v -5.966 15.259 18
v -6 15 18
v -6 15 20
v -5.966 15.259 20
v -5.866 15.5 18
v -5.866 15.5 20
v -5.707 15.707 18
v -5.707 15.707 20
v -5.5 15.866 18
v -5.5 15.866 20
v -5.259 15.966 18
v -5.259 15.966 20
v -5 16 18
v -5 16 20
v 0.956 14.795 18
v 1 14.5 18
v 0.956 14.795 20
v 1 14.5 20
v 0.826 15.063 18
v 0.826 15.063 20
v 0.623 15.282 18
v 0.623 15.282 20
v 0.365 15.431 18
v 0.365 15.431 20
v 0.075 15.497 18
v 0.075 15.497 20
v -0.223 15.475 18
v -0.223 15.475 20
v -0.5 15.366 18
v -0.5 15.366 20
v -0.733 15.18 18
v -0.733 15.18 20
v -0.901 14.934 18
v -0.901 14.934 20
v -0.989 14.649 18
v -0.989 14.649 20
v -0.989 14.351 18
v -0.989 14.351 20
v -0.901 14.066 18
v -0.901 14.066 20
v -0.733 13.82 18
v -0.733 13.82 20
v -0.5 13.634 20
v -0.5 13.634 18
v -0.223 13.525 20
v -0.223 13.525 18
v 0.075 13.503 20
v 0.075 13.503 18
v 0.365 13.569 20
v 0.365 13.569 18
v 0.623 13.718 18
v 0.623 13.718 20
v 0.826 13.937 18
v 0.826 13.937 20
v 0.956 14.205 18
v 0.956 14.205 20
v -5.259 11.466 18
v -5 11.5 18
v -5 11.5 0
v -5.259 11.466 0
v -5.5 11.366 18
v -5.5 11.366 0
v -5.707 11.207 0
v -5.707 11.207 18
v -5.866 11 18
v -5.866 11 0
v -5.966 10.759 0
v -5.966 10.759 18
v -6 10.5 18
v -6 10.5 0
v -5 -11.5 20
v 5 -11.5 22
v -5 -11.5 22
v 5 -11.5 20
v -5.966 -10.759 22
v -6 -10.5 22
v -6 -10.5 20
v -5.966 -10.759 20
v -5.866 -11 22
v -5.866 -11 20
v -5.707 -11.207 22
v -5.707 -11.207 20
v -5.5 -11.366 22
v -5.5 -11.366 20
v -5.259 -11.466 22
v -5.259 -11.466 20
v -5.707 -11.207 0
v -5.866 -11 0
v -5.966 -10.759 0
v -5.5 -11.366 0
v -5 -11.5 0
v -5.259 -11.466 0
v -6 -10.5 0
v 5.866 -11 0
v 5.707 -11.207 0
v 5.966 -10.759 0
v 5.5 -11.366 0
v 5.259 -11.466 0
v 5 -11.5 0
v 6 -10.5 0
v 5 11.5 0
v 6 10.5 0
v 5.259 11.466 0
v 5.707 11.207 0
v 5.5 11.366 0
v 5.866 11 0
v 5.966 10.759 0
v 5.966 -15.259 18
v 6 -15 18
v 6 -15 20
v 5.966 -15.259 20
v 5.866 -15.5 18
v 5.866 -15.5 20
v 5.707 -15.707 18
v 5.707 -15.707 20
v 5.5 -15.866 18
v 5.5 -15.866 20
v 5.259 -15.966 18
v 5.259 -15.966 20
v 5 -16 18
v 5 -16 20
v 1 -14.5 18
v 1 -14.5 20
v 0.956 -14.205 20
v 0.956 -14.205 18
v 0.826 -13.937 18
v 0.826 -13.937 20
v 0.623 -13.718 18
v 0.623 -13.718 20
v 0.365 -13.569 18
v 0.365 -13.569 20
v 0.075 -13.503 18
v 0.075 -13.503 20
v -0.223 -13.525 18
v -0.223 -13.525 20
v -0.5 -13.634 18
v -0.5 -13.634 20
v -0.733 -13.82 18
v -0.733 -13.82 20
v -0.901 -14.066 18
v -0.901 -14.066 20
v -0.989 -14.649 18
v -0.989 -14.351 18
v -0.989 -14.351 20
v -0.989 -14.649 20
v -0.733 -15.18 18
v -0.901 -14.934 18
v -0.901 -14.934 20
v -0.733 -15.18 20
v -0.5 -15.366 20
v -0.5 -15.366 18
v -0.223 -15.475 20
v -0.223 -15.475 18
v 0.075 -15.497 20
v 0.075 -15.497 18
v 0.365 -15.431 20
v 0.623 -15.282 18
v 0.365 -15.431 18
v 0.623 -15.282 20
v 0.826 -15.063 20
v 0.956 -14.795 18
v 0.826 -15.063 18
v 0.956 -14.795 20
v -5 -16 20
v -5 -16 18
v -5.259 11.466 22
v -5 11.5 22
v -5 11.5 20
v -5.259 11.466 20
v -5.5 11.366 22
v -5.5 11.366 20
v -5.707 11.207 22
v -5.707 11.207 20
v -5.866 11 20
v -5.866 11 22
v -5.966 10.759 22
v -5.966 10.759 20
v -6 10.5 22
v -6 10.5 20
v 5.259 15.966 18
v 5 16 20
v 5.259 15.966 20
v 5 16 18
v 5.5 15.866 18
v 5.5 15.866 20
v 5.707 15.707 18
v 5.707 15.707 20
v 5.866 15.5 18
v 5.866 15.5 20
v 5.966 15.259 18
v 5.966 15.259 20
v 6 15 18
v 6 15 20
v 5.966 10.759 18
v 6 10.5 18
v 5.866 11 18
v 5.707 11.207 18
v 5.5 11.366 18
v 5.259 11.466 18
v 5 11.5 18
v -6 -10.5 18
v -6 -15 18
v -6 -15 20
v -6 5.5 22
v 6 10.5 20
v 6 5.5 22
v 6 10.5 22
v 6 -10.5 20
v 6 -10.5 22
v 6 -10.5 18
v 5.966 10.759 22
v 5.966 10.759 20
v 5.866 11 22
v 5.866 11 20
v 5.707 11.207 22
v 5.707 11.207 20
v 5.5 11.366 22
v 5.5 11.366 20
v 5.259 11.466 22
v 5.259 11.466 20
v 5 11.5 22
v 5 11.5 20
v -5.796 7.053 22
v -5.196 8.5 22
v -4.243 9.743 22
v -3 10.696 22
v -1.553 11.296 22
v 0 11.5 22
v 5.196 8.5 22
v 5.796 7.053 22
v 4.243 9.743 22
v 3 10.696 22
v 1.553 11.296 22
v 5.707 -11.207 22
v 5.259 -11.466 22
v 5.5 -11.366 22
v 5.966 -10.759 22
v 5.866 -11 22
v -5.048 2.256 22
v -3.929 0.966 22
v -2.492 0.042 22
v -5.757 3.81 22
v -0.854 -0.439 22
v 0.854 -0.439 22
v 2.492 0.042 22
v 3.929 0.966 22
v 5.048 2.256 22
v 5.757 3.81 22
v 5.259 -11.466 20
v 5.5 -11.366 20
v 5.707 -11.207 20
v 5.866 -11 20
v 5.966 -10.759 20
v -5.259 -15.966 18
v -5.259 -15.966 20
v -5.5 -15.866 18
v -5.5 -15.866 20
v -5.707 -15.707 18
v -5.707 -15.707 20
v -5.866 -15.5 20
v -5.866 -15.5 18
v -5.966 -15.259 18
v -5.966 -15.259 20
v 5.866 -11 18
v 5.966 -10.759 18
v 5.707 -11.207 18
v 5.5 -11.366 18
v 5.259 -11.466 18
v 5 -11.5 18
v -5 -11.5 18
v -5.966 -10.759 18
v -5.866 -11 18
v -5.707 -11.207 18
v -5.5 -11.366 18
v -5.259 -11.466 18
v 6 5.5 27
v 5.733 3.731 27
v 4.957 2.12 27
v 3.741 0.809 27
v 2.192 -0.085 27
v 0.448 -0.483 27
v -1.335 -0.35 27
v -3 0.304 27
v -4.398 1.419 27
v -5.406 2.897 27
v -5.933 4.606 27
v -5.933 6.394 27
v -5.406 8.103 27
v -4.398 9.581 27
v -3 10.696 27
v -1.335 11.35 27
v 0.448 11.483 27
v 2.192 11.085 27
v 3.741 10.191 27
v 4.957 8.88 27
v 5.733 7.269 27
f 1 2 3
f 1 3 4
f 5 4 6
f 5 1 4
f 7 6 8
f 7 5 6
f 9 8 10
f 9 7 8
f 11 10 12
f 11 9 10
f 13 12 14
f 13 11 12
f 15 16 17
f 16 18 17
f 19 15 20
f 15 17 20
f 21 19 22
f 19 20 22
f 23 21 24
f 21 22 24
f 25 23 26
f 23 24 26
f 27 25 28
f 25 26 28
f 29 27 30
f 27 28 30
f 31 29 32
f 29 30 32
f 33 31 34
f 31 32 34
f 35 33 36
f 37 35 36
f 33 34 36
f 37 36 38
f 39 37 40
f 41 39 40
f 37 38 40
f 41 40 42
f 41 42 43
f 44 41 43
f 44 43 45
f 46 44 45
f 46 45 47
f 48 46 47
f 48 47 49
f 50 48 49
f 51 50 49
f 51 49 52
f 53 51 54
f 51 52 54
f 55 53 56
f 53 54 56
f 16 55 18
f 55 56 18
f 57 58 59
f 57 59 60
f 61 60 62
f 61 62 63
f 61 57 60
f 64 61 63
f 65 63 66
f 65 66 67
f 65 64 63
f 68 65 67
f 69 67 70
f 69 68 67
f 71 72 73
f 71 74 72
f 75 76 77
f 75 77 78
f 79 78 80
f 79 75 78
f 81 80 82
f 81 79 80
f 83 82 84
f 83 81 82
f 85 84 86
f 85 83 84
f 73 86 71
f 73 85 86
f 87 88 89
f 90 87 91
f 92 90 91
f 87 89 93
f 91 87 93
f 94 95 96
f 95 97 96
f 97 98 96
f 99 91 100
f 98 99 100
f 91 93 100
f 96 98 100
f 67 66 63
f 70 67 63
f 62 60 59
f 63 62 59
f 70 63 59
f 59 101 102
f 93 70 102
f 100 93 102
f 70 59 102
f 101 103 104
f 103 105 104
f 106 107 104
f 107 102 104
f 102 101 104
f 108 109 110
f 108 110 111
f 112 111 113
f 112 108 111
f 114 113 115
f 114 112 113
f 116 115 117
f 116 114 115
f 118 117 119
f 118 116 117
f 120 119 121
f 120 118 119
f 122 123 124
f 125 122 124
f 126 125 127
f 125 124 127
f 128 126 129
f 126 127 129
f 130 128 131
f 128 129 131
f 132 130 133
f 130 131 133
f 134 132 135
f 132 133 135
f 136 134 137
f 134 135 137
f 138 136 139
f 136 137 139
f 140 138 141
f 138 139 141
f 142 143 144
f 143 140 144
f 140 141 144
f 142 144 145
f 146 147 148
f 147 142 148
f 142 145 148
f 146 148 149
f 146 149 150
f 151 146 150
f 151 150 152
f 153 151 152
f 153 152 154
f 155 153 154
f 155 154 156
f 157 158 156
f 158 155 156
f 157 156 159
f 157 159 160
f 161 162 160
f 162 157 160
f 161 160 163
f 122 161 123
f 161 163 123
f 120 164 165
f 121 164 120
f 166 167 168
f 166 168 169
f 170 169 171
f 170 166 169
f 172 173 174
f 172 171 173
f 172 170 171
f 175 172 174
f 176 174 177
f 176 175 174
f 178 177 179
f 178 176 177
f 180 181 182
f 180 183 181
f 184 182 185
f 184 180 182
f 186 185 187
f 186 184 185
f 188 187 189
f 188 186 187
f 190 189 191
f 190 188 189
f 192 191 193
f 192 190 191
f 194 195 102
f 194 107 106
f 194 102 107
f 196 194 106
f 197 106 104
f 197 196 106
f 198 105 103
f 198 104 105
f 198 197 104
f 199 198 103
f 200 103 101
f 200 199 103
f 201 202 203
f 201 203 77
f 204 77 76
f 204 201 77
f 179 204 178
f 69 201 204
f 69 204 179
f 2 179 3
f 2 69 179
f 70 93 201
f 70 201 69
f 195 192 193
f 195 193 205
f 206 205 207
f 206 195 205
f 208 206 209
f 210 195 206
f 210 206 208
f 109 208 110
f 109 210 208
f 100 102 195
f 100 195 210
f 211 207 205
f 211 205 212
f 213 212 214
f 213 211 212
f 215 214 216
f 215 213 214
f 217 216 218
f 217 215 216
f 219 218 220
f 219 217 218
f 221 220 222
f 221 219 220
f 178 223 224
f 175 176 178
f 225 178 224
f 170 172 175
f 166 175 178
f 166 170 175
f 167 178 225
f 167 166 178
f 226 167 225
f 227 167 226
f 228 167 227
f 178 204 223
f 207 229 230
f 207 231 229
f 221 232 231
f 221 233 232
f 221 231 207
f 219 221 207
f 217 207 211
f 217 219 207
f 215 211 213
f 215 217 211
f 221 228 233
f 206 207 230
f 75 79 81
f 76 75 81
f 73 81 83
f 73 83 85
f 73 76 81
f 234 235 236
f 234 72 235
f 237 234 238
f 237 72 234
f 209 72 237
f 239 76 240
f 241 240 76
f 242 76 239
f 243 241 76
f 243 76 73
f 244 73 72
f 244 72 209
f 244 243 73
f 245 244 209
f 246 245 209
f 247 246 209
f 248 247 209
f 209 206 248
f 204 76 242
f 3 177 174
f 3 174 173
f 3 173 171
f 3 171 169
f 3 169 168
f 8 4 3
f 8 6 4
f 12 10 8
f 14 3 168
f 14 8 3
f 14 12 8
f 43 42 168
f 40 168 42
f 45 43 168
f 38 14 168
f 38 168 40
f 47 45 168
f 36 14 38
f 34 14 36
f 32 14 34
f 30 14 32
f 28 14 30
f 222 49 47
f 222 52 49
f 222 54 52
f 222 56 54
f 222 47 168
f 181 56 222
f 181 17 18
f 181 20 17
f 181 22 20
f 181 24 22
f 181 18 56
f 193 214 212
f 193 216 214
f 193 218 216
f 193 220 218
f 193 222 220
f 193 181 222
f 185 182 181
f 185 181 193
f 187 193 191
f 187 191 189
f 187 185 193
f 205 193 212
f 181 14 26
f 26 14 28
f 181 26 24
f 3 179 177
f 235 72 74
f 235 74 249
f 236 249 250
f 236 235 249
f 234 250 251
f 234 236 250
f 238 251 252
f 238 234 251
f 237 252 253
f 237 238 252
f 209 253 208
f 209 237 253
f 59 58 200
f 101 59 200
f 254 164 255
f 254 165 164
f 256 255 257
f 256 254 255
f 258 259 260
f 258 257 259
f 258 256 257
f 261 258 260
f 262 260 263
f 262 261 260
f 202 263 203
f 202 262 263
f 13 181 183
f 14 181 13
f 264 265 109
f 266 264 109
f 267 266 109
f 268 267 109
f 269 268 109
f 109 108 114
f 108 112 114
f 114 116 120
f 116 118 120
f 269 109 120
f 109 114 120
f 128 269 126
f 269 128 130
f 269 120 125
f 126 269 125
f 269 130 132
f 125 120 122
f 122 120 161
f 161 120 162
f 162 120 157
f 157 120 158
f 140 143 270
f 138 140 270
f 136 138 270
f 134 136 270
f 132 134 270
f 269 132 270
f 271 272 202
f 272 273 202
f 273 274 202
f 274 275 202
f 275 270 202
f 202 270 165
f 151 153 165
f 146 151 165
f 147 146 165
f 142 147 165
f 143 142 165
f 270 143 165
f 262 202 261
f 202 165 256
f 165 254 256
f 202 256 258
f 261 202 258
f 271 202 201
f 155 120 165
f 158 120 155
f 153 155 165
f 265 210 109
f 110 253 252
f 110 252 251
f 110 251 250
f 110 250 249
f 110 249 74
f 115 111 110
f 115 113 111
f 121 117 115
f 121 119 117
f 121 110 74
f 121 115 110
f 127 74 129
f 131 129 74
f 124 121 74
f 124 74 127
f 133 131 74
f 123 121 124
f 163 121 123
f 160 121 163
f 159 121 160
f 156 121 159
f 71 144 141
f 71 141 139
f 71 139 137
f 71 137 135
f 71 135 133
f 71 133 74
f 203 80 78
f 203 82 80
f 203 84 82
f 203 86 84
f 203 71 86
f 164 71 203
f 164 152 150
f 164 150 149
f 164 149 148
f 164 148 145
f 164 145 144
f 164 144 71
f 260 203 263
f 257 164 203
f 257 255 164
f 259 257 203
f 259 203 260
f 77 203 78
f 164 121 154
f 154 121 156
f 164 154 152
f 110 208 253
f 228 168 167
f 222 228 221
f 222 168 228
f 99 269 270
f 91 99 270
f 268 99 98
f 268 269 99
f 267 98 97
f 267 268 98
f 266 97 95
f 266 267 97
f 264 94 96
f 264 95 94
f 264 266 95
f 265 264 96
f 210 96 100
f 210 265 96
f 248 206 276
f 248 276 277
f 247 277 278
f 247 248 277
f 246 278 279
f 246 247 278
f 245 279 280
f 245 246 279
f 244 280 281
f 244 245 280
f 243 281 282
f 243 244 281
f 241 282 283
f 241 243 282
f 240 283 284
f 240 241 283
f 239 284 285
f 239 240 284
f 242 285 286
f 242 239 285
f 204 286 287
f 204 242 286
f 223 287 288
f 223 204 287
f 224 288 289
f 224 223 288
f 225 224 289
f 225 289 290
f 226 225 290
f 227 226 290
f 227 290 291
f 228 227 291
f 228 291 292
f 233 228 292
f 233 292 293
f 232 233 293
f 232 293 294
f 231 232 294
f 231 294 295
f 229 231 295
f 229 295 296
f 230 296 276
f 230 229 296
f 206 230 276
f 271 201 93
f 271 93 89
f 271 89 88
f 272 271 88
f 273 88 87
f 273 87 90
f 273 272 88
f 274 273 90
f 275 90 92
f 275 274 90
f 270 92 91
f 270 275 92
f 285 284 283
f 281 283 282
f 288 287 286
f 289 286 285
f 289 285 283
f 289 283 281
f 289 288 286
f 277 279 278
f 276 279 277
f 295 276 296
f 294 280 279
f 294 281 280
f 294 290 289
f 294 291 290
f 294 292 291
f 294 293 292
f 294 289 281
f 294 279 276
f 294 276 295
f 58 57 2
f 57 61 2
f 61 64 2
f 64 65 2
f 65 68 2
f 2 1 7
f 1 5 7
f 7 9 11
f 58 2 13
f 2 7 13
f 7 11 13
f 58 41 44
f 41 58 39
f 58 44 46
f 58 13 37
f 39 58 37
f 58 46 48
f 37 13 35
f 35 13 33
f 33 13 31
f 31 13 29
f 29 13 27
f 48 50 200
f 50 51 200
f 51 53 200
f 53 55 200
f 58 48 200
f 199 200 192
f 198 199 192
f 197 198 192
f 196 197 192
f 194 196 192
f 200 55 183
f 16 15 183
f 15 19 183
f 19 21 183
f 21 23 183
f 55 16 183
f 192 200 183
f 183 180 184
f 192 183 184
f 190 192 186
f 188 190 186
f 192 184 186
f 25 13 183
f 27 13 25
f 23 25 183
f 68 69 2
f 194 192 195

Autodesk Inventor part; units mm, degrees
ref_plane "YZ Plane" through (0, 0, 0) normal (1, 0, 0) x (0, 1, 0)
ref_plane "XZ Plane" through (0, 0, 0) normal (0, 1, 0) x (-1, 0, 0)
sketch "Sketch1" plane through (0, 0, 0) normal (0, 0, 1) x (1, 0, 0)
  line L0 (-6, 11.5) -> (6, 11.5)
  line L1 (6, 11.5) -> (6, -11.5)
  line L2 (6, -11.5) -> (-6, -11.5)
  line L3 (-6, -11.5) -> (-6, 11.5)
  line L4 (0, 0) -> (0, -6.2119)
  line L5 (0, 0) -> (2.7529, 0)
  dimension "d0" = 12
  dimension "d1" = 23
extrude "Extrusion1" add sketch "Sketch1" along normal blind 22
ref_plane "Work Plane1" through (0, 0, 20) normal (0, 0, 1) x (1, 0, 0)
sketch "Sketch2" plane through (0, 0, 20) normal (0, 0, 1) x (1, 0, 0)
  line L0 (6, 11.5) -> (-6, 11.5) projected
  line L1 (-6, 11.5) -> (6, 11.5)
  line L2 (6, 11.5) -> (6, 16)
  line L3 (6, 16) -> (-6, 16)
  line L4 (-6, 16) -> (-6, 11.5)
  line L5 (6, -11.5) -> (6, 11.5) projected
  point P0 (0, 0)
  dimension "d5" = 4.5
extrude "Extrusion2" add sketch "Sketch2" against normal blind 2
sketch "Sketch3" plane through (0, 0, 20) normal (0, 0, 1) x (1, 0, 0)
  circle A0 centre (0, 14.5) radius 1
  line L0 (6, 16) -> (-6, 16) projected
  point P0 (0, 0)
  dimension "d8" = 2
  dimension "d9" = 1.5
extrude "Extrusion3" cut sketch "Sketch3" against normal blind 2
fillet "Fillet1" radius 1 6 edges at (6, 16, 19) (-6, 16, 19) (6, 11.5, 9) (6, 11.5, 21) (-6, 11.5, 21) (-6, 11.5, 9)
mirror "Mirror1" about plane through (0, 0, 0) normal (0, 1, 0) of "Extrusion2", "Extrusion3", "Fillet1"
fillet_without_effect "Fillet2"
sketch "Sketch4" plane through (0, 0, 22) normal (0, 0, 1) x (1, 0, 0)
  circle A0 centre (0, 5.5) radius 6
  line L0 (5, 11.5) -> (-5, 11.5) projected
  point P0 (0, 0)
  dimension "d14" = 12
extrude "Extrusion4" add sketch "Sketch4" along normal blind 5
properties part number "MicroServo"
